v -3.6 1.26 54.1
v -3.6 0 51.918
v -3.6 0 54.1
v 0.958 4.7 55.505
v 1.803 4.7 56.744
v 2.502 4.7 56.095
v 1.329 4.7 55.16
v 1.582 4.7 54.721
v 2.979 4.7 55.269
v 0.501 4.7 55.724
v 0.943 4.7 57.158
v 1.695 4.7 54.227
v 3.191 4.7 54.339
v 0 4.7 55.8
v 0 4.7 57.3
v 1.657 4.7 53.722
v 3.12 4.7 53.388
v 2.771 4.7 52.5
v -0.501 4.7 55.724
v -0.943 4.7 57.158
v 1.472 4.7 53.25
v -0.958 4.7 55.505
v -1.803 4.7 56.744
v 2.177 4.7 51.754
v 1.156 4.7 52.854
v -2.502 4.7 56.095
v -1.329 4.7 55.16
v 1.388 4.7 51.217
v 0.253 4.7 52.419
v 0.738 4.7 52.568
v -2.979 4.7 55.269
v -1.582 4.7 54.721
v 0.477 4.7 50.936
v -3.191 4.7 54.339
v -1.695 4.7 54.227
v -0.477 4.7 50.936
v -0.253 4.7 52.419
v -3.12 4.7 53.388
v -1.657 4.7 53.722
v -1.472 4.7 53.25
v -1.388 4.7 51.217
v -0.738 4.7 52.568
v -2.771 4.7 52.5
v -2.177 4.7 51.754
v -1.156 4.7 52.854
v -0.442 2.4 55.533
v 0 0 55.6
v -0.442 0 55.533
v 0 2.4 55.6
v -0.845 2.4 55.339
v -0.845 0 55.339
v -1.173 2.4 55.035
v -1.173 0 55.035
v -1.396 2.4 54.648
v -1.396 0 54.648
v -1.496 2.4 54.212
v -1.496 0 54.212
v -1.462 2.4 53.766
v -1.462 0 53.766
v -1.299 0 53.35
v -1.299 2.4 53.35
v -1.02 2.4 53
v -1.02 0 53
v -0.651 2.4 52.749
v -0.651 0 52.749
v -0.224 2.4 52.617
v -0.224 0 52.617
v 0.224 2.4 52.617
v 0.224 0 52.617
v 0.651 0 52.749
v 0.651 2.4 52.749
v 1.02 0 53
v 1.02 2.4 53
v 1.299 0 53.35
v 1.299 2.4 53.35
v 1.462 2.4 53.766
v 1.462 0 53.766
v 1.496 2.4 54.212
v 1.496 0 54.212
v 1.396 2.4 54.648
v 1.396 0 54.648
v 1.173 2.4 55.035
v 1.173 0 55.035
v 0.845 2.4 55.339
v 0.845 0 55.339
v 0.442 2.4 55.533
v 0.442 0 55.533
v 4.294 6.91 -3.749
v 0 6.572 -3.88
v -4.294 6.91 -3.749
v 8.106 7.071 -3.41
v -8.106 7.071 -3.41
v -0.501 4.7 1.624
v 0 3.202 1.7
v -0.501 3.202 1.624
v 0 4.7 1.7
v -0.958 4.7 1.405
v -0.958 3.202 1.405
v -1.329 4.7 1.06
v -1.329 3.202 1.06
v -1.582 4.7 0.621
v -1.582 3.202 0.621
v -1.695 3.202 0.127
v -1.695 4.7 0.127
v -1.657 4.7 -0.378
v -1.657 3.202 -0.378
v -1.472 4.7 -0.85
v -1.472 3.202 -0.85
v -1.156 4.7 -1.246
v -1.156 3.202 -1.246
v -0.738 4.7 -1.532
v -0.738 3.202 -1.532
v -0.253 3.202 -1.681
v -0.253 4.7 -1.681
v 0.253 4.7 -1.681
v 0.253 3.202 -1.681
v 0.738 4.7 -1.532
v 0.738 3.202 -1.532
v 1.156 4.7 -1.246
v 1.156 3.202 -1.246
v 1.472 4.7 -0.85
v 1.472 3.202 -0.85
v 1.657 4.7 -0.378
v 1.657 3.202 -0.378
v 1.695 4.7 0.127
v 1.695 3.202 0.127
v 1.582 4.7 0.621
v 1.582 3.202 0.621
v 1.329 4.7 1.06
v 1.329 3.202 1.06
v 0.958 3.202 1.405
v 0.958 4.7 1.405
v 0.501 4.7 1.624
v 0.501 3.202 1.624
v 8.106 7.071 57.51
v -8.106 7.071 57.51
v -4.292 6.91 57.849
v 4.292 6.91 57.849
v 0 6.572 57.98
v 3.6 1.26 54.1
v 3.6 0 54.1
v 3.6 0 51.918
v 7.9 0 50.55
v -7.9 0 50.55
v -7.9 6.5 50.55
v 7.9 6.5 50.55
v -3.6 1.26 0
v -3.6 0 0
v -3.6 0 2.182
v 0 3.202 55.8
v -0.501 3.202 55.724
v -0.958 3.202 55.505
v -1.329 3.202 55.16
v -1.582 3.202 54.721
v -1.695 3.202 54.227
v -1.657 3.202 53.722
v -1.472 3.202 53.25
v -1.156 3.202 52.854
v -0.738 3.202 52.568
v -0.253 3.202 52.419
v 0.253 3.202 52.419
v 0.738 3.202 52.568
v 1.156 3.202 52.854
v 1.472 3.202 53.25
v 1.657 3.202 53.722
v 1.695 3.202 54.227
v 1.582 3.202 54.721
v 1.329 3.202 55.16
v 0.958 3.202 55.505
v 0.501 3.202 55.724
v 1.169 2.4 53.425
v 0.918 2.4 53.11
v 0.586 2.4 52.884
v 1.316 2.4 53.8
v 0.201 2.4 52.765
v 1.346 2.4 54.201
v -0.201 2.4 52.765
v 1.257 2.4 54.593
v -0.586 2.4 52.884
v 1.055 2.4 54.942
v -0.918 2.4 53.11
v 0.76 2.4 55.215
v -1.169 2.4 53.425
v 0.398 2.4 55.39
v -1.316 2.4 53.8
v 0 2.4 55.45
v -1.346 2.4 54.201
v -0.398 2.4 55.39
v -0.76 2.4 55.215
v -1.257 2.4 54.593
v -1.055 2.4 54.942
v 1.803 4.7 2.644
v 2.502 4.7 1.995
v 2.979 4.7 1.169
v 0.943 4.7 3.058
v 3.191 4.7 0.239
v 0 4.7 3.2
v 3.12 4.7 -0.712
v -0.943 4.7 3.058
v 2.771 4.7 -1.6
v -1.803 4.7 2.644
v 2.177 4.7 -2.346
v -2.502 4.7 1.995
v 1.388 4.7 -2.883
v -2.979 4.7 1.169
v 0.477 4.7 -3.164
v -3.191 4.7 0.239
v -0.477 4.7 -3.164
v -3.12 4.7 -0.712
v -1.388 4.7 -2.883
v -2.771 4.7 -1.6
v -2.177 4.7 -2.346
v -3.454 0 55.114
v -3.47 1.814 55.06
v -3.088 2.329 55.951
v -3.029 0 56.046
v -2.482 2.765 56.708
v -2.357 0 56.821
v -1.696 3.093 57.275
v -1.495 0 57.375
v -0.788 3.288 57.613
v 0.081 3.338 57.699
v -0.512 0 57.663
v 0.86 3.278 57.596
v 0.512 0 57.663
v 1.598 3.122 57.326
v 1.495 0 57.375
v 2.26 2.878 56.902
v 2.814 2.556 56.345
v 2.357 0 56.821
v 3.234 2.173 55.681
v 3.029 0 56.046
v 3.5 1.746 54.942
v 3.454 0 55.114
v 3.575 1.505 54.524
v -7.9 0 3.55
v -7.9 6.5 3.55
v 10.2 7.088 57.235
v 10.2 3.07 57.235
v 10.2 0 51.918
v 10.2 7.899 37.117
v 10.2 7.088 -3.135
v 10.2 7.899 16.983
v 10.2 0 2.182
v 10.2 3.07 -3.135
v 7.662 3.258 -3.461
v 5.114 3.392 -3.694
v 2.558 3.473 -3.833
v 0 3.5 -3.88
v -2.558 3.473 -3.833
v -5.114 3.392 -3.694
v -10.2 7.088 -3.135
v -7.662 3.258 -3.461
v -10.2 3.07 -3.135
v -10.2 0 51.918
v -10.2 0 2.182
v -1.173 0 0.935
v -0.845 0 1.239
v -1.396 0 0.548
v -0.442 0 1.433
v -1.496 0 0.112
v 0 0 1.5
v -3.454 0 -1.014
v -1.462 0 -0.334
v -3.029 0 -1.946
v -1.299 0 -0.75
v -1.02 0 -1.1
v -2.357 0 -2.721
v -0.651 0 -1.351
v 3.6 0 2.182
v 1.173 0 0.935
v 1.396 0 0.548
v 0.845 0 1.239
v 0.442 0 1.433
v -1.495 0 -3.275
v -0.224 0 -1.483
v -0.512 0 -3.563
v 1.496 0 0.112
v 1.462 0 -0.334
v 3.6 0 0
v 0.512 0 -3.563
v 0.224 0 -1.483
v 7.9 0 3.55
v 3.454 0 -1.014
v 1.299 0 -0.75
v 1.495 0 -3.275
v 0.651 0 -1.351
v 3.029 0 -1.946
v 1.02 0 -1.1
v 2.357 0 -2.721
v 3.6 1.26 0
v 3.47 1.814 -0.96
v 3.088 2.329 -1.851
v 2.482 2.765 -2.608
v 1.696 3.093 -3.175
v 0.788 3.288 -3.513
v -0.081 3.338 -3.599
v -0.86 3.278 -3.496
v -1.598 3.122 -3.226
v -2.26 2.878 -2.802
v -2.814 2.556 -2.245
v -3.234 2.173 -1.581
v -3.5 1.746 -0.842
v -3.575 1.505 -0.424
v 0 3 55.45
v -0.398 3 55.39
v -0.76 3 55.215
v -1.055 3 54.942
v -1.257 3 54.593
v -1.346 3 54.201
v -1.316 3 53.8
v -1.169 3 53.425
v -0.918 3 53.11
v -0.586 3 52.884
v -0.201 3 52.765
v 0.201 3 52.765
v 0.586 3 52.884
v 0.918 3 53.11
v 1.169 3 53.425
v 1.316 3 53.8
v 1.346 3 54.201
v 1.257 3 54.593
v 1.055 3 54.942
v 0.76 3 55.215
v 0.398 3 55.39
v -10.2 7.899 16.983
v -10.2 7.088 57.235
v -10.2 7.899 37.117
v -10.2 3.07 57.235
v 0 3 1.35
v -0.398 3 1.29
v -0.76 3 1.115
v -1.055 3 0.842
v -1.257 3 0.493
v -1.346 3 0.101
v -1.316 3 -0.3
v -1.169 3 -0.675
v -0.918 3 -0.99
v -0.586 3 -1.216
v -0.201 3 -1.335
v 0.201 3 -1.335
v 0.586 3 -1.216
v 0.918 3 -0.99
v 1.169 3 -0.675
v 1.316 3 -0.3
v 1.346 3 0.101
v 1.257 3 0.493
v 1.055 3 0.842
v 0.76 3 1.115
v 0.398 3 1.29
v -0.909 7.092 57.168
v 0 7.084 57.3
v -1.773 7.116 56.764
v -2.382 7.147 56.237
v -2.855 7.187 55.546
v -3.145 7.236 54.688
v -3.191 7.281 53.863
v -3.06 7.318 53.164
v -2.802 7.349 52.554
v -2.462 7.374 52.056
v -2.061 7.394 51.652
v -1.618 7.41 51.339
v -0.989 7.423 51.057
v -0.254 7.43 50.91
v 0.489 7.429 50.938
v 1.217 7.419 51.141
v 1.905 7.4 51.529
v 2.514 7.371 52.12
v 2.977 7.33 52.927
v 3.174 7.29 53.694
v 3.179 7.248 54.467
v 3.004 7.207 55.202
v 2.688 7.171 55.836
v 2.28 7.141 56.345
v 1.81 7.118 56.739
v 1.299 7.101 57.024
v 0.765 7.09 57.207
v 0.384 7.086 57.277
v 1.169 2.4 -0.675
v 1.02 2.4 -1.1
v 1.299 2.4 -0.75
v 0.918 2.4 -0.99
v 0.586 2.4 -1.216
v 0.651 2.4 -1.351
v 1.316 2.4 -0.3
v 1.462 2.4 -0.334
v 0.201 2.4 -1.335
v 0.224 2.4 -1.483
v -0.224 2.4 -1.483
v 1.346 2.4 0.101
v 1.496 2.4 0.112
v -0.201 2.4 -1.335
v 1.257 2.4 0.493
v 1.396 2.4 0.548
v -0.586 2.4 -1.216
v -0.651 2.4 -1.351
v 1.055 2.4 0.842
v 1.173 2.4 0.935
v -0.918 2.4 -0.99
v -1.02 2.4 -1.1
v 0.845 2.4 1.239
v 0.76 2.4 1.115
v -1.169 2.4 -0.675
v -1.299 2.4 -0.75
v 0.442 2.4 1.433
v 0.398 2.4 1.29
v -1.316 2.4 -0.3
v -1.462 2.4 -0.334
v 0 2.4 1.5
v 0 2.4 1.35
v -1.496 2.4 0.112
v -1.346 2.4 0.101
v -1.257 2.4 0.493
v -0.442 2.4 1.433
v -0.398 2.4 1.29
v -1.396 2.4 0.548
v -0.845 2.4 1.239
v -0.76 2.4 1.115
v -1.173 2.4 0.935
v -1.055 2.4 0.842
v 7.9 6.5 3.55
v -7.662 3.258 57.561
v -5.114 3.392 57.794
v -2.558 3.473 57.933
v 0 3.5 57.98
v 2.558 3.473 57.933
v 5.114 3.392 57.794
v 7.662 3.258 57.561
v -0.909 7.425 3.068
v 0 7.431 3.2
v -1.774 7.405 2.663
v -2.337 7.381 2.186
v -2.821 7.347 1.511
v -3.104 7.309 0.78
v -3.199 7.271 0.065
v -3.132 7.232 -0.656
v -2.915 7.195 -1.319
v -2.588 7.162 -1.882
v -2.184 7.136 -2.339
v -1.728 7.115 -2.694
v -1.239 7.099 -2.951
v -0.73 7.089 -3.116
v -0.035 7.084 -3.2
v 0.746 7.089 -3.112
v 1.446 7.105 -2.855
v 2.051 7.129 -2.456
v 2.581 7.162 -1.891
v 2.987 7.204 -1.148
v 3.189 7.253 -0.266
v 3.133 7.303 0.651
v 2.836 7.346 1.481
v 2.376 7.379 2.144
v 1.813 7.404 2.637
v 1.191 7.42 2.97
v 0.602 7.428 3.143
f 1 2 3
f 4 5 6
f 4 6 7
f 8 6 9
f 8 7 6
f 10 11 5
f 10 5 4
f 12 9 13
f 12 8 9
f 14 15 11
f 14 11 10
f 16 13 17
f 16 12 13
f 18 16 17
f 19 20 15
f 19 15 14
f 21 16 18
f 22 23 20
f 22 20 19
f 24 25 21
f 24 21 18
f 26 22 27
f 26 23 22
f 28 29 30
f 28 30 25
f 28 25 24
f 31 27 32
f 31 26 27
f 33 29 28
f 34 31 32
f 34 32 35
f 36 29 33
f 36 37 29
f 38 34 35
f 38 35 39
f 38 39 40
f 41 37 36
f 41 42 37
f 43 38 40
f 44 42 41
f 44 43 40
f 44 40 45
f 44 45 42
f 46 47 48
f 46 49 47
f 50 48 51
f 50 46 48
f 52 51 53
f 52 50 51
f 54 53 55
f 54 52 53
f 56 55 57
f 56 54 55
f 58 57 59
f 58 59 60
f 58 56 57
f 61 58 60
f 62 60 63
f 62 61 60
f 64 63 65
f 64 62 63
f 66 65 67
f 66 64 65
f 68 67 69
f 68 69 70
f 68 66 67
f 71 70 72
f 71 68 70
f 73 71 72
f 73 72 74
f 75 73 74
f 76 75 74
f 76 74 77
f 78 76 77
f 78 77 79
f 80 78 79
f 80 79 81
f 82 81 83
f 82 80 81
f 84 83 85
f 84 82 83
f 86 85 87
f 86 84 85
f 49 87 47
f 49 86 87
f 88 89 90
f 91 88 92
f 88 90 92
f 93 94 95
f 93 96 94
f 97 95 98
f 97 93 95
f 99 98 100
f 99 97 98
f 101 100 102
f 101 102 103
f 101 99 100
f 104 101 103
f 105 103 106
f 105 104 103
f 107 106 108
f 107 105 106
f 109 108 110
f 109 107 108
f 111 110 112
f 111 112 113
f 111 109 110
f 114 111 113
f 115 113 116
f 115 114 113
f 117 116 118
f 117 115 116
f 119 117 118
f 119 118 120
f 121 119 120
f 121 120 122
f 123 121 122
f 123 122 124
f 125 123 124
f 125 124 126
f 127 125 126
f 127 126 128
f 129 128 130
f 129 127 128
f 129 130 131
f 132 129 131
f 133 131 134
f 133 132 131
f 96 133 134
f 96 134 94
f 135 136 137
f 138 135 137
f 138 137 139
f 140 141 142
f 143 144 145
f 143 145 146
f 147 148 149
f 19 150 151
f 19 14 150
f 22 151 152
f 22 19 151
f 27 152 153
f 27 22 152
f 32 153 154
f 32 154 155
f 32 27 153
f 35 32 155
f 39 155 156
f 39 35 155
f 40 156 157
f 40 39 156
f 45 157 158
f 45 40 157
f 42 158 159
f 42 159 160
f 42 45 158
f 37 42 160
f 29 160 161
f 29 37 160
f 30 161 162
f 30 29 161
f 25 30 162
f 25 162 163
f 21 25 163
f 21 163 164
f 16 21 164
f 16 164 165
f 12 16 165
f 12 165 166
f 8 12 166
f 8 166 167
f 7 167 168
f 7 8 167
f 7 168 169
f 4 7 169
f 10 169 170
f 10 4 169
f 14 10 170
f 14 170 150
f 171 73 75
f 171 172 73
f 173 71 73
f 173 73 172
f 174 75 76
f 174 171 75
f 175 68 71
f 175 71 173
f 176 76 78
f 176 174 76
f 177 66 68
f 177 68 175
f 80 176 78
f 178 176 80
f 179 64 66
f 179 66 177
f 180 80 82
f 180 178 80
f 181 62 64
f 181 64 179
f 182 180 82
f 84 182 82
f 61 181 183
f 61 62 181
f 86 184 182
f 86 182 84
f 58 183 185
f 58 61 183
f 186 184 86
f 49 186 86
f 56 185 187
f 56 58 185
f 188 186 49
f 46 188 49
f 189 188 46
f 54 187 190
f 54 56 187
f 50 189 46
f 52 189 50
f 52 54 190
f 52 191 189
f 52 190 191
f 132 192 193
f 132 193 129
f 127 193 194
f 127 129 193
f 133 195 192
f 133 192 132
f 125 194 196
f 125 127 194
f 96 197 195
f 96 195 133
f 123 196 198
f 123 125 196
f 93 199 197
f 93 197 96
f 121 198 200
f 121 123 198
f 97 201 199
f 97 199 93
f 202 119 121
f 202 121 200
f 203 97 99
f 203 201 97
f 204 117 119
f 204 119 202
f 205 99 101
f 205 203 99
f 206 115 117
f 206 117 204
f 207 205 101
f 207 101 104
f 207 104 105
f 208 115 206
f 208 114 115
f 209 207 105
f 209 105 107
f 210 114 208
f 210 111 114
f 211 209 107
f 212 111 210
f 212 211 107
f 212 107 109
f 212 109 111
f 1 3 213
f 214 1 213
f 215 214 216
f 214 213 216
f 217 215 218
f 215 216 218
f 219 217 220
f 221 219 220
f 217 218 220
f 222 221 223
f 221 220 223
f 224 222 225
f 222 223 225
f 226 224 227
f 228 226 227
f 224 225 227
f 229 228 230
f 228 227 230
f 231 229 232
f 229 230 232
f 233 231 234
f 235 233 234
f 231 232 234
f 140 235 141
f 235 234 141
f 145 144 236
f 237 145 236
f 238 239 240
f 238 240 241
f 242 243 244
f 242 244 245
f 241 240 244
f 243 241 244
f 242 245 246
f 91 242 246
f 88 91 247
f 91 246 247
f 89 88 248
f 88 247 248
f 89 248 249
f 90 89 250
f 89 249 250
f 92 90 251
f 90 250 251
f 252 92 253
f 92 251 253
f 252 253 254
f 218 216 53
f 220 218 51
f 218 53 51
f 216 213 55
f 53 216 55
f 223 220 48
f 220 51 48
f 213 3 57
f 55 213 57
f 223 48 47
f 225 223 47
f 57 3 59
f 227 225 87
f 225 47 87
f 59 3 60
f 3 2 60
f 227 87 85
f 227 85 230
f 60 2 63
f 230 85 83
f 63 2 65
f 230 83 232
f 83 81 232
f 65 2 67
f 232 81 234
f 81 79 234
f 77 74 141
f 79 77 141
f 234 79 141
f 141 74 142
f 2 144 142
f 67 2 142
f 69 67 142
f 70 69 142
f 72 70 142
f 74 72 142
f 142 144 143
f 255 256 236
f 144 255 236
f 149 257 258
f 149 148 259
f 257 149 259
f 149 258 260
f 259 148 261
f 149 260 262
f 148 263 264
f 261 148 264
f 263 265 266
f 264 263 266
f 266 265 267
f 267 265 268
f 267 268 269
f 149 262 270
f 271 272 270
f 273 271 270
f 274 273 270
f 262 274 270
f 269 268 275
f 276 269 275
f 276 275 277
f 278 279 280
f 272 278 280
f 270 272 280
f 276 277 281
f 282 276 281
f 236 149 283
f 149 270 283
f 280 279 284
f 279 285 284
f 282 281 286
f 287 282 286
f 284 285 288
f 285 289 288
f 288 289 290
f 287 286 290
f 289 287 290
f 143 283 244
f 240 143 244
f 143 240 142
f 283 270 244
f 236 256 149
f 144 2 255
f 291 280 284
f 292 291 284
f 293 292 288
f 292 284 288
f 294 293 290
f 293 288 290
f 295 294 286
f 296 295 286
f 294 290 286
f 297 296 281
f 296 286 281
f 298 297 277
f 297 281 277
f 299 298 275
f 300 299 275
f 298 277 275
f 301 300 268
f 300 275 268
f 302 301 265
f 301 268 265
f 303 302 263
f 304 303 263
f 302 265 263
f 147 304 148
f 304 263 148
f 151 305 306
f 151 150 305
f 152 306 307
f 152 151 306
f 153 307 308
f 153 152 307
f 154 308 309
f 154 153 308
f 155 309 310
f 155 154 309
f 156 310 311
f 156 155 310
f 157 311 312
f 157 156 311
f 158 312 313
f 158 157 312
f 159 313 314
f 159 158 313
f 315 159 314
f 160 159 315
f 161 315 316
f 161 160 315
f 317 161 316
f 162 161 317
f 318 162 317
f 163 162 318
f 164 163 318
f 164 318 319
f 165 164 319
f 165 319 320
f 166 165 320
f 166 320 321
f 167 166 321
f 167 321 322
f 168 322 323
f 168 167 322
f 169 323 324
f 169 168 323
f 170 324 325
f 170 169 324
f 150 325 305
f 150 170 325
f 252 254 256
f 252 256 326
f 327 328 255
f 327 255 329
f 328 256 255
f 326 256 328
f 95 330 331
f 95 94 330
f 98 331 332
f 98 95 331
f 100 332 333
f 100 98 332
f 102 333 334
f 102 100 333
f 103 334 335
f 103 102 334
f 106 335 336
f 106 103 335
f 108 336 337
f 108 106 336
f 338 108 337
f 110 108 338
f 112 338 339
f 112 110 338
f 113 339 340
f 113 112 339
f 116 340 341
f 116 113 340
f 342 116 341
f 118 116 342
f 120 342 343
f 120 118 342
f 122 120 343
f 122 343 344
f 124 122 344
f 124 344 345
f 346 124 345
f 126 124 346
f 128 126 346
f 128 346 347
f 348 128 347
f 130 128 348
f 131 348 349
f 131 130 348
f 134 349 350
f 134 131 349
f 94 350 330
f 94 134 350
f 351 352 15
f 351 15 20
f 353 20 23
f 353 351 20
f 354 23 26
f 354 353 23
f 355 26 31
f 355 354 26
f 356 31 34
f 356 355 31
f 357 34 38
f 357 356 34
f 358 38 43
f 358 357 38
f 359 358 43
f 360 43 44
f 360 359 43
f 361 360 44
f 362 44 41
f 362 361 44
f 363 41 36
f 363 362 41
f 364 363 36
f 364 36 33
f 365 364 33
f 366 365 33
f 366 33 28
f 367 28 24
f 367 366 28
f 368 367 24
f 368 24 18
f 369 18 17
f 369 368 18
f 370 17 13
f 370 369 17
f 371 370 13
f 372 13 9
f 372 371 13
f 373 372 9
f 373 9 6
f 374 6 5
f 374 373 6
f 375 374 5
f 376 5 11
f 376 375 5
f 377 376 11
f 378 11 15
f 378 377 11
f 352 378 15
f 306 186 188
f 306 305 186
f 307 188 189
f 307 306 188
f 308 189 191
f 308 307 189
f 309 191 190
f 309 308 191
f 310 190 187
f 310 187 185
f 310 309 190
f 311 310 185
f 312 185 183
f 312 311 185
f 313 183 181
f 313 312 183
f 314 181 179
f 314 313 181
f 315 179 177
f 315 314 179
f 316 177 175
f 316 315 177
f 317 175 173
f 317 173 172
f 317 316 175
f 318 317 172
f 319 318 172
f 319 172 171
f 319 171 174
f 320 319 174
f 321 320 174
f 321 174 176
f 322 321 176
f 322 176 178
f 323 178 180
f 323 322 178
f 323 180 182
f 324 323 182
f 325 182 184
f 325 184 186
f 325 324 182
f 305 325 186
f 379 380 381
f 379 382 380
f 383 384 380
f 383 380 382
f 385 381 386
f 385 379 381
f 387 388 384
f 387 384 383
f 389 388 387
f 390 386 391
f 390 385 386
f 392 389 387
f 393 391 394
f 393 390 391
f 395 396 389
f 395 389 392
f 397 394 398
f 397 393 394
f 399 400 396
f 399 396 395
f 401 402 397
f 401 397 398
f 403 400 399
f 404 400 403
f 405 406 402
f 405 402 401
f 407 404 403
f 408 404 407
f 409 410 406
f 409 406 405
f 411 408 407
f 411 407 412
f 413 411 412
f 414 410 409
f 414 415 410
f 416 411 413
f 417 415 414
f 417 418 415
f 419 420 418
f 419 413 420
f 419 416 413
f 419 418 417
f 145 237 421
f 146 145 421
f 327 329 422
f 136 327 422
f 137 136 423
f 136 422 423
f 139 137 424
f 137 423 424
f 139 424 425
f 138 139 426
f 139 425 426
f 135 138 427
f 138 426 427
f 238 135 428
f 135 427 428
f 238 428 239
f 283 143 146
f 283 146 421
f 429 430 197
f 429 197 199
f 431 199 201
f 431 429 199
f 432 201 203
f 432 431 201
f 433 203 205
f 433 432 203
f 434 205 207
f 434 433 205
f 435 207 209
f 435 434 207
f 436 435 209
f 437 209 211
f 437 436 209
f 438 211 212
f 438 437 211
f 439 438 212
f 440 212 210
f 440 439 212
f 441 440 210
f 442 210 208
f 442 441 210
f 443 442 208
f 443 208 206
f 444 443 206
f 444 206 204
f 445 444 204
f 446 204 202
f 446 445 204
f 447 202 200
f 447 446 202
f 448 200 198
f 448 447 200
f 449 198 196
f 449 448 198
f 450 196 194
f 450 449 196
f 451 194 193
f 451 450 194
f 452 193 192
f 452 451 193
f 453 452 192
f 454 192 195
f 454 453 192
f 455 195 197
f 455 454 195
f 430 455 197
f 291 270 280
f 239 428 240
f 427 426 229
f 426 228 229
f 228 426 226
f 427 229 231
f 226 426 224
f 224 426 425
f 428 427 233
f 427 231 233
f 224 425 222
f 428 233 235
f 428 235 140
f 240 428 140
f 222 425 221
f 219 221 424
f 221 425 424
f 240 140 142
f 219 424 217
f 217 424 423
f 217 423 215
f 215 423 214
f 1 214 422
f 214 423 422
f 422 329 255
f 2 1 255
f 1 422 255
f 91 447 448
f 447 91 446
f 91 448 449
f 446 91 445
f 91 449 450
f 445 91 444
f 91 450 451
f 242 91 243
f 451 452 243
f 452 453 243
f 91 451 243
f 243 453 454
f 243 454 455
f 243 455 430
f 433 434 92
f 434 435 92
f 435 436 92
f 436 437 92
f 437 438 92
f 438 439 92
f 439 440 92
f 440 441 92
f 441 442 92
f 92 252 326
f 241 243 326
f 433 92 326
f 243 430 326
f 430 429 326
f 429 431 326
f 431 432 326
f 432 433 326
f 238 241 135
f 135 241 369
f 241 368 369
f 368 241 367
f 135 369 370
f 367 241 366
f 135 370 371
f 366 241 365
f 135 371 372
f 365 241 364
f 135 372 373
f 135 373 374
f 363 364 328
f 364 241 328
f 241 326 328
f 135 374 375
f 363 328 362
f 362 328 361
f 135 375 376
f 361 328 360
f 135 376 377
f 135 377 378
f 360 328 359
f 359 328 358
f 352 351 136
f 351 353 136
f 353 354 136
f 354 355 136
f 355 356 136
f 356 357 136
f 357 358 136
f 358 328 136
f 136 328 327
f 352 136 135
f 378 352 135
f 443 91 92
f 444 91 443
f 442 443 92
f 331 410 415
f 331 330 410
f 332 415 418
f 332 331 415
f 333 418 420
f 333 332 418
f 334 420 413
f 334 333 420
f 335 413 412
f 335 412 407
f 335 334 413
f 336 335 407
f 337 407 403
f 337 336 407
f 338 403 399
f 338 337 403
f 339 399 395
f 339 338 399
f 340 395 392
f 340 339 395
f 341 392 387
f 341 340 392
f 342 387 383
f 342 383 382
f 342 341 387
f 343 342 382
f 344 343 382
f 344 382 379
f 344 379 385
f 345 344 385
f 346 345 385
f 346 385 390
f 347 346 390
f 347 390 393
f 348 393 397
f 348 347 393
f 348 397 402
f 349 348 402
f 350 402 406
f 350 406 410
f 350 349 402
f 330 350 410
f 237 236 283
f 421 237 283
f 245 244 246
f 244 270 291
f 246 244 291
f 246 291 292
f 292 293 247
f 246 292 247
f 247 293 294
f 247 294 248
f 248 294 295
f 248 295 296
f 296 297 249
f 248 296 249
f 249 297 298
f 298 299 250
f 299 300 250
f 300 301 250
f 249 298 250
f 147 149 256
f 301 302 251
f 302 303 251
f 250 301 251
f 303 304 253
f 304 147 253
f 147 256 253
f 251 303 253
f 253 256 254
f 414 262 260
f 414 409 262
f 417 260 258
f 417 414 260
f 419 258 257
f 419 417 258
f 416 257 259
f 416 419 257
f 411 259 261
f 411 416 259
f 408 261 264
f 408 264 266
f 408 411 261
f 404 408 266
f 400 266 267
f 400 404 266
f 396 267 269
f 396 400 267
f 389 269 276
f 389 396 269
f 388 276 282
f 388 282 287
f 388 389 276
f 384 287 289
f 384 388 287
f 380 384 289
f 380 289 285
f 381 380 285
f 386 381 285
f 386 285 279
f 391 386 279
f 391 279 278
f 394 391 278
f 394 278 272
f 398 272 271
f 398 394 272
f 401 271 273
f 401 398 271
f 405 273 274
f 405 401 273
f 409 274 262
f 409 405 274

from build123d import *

# Parameters (mm, degrees)
BOSS_EXTRUDE1_DEPTH     = 10
SKETCH2_W               = 83.569070853
SKETCH2_H               = 48.012038302
CUT_EXTRUDE1_DEPTH      = 12
CUT_EXTRUDE1_DEPTH_BACK = 12
BOSS_EXTRUDE2_DEPTH     = 5
BOSS_EXTRUDE3_DEPTH     = 5
SKETCH5_W               = 15.8
SKETCH5_H               = 47
CUT_EXTRUDE2_DEPTH      = 6.5


with BuildPart() as part:
    # Sketch1 → Boss-Extrude1 (new body)
    with BuildSketch(Plane(origin=(0, 0, 0), x_dir=(1, 0, 0), z_dir=(0, 1, 0))):
        with BuildLine():
            Line((10.2, -57.235021417), (10.2, 3.135021417))
            ThreePointArc((10.2, 3.135021417), (0, 3.88), (-10.2, 3.135021417))
            Line((-10.2, 3.135021417), (-10.2, -57.235021417))
            ThreePointArc((-10.2, -57.235021417), (0, -57.98), (10.2, -57.235021417))
        make_face()
    extrude(amount=BOSS_EXTRUDE1_DEPTH)

    # Sketch2 → Cut-Extrude1 (cut, two sides)
    with BuildSketch(Plane(origin=(0, 0, 0), x_dir=(0, 0, -1), z_dir=(1, 0, 0))) as cut_extrude1_sk:
        with Locations((-26.748669216, 4)):
            Rectangle(SKETCH2_W, SKETCH2_H)
        with BuildLine():
            Line((-57.98, 6.572226563), (-57.98, 3.5))
            Line((-57.98, 3.5), (-51.917822174, 0))
            Line((-51.917822174, 0), (-2.182177826, 0))
            Line((-2.182177826, 0), (3.88, 3.5))
            Line((3.88, 3.5), (3.88, 6.572226563))
            ThreePointArc((3.88, 6.572226563), (3.7441635, 6.914841427), (3.410460219, 7.071297876))
            ThreePointArc((3.410460219, 7.071297876), (-27.050000121, 8), (-57.51046046, 7.071297861))
            ThreePointArc((-57.51046046, 7.071297861), (-57.844163583, 6.914841339), (-57.98, 6.572226563))
        make_face(mode=Mode.SUBTRACT)
    extrude(amount=CUT_EXTRUDE1_DEPTH, mode=Mode.SUBTRACT)
    extrude(cut_extrude1_sk.sketch, amount=-CUT_EXTRUDE1_DEPTH_BACK, mode=Mode.SUBTRACT)

    # Sketch3 → Boss-Extrude2 (add)
    with BuildSketch(Plane(origin=(0, 0, 0), x_dir=(1, 0, 0), z_dir=(0, 1, 0))):
        with BuildLine():
            Line((-3.6, 0), (-3.6, -3.6))
            Line((-3.6, -3.6), (3.6, -3.6))
            Line((3.6, -3.6), (3.6, 0))
            ThreePointArc((3.6, 0), (0, 3.600000126), (-3.6, 0))
        make_face()
    extrude(amount=BOSS_EXTRUDE2_DEPTH)

    # Sketch4 → Boss-Extrude3 (add)
    with BuildSketch(Plane(origin=(0, 0, 0), x_dir=(1, 0, 0), z_dir=(0, 1, 0))):
        with BuildLine():
            Line((3.6, -54.1), (3.6, -50.5))
            Line((3.6, -50.5), (-3.6, -50.5))
            Line((-3.6, -50.5), (-3.6, -54.1))
            ThreePointArc((-3.6, -54.1), (0, -57.7), (3.6, -54.1))
        make_face()
    extrude(amount=BOSS_EXTRUDE3_DEPTH)

    # Sketch5 → Cut-Extrude2 (cut)
    with BuildSketch(Plane(origin=(0, 0, 0), x_dir=(1, 0, 0), z_dir=(0, 1, 0))):
        with Locations((0, -27.05)):
            Rectangle(SKETCH5_W, SKETCH5_H)
    extrude(amount=CUT_EXTRUDE2_DEPTH, mode=Mode.SUBTRACT)

    # Sketch6 → Cut-Revolve1 (revolve, cut)
    with BuildSketch(Plane(origin=(0, 0, 0), x_dir=(0, 0, -1), z_dir=(1, 0, 0))):
        Polygon((0, 0), (-1.5, 0), (-1.5, 2.4), (-1.35, 2.4), (-1.35, 3), (-1.7, 3.202072594), (-1.7, 4.7), (-3.2, 4.7), (-3.2, 8), (0, 8), align=None)
    revolve(axis=Axis((0, 8, 0), (0, -1, 0)), mode=Mode.SUBTRACT)

    # Sketch7 → Cut-Revolve2 (revolve, cut)
    with BuildSketch(Plane(origin=(0, 0, 0), x_dir=(0, 0, -1), z_dir=(1, 0, 0))):
        Polygon((-54.1, 0), (-55.6, 0), (-55.6, 2.4), (-55.45, 2.4), (-55.45, 3), (-55.8, 3.202072594), (-55.8, 4.7), (-57.3, 4.7), (-57.3, 8), (-54.1, 8), align=None)
    revolve(axis=Axis((0, 8, 54.1), (0, -1, 0)), mode=Mode.SUBTRACT)


solid = part.part
